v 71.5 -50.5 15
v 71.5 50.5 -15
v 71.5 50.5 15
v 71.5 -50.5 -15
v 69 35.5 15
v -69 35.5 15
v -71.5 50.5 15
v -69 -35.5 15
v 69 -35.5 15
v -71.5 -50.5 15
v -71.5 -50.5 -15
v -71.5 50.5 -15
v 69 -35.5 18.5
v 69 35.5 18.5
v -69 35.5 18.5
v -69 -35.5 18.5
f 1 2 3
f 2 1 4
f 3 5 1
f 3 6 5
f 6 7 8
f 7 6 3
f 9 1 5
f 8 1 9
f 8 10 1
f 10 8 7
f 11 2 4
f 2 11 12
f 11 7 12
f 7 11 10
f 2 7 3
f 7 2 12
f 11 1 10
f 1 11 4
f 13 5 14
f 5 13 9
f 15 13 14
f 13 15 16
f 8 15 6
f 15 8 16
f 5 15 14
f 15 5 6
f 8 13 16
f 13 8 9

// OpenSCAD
scale([1, 1])  {
    cube(([143,101,30]), center = true);
    translate([0, 0, 3])
        cube(([138,71,31]), center = true);
     translate([0, 0, 0])
        cube(([135,95,25]), center = true);
      translate([0, 0, 3])
        cube(([100,71,31]), center = true);    }
